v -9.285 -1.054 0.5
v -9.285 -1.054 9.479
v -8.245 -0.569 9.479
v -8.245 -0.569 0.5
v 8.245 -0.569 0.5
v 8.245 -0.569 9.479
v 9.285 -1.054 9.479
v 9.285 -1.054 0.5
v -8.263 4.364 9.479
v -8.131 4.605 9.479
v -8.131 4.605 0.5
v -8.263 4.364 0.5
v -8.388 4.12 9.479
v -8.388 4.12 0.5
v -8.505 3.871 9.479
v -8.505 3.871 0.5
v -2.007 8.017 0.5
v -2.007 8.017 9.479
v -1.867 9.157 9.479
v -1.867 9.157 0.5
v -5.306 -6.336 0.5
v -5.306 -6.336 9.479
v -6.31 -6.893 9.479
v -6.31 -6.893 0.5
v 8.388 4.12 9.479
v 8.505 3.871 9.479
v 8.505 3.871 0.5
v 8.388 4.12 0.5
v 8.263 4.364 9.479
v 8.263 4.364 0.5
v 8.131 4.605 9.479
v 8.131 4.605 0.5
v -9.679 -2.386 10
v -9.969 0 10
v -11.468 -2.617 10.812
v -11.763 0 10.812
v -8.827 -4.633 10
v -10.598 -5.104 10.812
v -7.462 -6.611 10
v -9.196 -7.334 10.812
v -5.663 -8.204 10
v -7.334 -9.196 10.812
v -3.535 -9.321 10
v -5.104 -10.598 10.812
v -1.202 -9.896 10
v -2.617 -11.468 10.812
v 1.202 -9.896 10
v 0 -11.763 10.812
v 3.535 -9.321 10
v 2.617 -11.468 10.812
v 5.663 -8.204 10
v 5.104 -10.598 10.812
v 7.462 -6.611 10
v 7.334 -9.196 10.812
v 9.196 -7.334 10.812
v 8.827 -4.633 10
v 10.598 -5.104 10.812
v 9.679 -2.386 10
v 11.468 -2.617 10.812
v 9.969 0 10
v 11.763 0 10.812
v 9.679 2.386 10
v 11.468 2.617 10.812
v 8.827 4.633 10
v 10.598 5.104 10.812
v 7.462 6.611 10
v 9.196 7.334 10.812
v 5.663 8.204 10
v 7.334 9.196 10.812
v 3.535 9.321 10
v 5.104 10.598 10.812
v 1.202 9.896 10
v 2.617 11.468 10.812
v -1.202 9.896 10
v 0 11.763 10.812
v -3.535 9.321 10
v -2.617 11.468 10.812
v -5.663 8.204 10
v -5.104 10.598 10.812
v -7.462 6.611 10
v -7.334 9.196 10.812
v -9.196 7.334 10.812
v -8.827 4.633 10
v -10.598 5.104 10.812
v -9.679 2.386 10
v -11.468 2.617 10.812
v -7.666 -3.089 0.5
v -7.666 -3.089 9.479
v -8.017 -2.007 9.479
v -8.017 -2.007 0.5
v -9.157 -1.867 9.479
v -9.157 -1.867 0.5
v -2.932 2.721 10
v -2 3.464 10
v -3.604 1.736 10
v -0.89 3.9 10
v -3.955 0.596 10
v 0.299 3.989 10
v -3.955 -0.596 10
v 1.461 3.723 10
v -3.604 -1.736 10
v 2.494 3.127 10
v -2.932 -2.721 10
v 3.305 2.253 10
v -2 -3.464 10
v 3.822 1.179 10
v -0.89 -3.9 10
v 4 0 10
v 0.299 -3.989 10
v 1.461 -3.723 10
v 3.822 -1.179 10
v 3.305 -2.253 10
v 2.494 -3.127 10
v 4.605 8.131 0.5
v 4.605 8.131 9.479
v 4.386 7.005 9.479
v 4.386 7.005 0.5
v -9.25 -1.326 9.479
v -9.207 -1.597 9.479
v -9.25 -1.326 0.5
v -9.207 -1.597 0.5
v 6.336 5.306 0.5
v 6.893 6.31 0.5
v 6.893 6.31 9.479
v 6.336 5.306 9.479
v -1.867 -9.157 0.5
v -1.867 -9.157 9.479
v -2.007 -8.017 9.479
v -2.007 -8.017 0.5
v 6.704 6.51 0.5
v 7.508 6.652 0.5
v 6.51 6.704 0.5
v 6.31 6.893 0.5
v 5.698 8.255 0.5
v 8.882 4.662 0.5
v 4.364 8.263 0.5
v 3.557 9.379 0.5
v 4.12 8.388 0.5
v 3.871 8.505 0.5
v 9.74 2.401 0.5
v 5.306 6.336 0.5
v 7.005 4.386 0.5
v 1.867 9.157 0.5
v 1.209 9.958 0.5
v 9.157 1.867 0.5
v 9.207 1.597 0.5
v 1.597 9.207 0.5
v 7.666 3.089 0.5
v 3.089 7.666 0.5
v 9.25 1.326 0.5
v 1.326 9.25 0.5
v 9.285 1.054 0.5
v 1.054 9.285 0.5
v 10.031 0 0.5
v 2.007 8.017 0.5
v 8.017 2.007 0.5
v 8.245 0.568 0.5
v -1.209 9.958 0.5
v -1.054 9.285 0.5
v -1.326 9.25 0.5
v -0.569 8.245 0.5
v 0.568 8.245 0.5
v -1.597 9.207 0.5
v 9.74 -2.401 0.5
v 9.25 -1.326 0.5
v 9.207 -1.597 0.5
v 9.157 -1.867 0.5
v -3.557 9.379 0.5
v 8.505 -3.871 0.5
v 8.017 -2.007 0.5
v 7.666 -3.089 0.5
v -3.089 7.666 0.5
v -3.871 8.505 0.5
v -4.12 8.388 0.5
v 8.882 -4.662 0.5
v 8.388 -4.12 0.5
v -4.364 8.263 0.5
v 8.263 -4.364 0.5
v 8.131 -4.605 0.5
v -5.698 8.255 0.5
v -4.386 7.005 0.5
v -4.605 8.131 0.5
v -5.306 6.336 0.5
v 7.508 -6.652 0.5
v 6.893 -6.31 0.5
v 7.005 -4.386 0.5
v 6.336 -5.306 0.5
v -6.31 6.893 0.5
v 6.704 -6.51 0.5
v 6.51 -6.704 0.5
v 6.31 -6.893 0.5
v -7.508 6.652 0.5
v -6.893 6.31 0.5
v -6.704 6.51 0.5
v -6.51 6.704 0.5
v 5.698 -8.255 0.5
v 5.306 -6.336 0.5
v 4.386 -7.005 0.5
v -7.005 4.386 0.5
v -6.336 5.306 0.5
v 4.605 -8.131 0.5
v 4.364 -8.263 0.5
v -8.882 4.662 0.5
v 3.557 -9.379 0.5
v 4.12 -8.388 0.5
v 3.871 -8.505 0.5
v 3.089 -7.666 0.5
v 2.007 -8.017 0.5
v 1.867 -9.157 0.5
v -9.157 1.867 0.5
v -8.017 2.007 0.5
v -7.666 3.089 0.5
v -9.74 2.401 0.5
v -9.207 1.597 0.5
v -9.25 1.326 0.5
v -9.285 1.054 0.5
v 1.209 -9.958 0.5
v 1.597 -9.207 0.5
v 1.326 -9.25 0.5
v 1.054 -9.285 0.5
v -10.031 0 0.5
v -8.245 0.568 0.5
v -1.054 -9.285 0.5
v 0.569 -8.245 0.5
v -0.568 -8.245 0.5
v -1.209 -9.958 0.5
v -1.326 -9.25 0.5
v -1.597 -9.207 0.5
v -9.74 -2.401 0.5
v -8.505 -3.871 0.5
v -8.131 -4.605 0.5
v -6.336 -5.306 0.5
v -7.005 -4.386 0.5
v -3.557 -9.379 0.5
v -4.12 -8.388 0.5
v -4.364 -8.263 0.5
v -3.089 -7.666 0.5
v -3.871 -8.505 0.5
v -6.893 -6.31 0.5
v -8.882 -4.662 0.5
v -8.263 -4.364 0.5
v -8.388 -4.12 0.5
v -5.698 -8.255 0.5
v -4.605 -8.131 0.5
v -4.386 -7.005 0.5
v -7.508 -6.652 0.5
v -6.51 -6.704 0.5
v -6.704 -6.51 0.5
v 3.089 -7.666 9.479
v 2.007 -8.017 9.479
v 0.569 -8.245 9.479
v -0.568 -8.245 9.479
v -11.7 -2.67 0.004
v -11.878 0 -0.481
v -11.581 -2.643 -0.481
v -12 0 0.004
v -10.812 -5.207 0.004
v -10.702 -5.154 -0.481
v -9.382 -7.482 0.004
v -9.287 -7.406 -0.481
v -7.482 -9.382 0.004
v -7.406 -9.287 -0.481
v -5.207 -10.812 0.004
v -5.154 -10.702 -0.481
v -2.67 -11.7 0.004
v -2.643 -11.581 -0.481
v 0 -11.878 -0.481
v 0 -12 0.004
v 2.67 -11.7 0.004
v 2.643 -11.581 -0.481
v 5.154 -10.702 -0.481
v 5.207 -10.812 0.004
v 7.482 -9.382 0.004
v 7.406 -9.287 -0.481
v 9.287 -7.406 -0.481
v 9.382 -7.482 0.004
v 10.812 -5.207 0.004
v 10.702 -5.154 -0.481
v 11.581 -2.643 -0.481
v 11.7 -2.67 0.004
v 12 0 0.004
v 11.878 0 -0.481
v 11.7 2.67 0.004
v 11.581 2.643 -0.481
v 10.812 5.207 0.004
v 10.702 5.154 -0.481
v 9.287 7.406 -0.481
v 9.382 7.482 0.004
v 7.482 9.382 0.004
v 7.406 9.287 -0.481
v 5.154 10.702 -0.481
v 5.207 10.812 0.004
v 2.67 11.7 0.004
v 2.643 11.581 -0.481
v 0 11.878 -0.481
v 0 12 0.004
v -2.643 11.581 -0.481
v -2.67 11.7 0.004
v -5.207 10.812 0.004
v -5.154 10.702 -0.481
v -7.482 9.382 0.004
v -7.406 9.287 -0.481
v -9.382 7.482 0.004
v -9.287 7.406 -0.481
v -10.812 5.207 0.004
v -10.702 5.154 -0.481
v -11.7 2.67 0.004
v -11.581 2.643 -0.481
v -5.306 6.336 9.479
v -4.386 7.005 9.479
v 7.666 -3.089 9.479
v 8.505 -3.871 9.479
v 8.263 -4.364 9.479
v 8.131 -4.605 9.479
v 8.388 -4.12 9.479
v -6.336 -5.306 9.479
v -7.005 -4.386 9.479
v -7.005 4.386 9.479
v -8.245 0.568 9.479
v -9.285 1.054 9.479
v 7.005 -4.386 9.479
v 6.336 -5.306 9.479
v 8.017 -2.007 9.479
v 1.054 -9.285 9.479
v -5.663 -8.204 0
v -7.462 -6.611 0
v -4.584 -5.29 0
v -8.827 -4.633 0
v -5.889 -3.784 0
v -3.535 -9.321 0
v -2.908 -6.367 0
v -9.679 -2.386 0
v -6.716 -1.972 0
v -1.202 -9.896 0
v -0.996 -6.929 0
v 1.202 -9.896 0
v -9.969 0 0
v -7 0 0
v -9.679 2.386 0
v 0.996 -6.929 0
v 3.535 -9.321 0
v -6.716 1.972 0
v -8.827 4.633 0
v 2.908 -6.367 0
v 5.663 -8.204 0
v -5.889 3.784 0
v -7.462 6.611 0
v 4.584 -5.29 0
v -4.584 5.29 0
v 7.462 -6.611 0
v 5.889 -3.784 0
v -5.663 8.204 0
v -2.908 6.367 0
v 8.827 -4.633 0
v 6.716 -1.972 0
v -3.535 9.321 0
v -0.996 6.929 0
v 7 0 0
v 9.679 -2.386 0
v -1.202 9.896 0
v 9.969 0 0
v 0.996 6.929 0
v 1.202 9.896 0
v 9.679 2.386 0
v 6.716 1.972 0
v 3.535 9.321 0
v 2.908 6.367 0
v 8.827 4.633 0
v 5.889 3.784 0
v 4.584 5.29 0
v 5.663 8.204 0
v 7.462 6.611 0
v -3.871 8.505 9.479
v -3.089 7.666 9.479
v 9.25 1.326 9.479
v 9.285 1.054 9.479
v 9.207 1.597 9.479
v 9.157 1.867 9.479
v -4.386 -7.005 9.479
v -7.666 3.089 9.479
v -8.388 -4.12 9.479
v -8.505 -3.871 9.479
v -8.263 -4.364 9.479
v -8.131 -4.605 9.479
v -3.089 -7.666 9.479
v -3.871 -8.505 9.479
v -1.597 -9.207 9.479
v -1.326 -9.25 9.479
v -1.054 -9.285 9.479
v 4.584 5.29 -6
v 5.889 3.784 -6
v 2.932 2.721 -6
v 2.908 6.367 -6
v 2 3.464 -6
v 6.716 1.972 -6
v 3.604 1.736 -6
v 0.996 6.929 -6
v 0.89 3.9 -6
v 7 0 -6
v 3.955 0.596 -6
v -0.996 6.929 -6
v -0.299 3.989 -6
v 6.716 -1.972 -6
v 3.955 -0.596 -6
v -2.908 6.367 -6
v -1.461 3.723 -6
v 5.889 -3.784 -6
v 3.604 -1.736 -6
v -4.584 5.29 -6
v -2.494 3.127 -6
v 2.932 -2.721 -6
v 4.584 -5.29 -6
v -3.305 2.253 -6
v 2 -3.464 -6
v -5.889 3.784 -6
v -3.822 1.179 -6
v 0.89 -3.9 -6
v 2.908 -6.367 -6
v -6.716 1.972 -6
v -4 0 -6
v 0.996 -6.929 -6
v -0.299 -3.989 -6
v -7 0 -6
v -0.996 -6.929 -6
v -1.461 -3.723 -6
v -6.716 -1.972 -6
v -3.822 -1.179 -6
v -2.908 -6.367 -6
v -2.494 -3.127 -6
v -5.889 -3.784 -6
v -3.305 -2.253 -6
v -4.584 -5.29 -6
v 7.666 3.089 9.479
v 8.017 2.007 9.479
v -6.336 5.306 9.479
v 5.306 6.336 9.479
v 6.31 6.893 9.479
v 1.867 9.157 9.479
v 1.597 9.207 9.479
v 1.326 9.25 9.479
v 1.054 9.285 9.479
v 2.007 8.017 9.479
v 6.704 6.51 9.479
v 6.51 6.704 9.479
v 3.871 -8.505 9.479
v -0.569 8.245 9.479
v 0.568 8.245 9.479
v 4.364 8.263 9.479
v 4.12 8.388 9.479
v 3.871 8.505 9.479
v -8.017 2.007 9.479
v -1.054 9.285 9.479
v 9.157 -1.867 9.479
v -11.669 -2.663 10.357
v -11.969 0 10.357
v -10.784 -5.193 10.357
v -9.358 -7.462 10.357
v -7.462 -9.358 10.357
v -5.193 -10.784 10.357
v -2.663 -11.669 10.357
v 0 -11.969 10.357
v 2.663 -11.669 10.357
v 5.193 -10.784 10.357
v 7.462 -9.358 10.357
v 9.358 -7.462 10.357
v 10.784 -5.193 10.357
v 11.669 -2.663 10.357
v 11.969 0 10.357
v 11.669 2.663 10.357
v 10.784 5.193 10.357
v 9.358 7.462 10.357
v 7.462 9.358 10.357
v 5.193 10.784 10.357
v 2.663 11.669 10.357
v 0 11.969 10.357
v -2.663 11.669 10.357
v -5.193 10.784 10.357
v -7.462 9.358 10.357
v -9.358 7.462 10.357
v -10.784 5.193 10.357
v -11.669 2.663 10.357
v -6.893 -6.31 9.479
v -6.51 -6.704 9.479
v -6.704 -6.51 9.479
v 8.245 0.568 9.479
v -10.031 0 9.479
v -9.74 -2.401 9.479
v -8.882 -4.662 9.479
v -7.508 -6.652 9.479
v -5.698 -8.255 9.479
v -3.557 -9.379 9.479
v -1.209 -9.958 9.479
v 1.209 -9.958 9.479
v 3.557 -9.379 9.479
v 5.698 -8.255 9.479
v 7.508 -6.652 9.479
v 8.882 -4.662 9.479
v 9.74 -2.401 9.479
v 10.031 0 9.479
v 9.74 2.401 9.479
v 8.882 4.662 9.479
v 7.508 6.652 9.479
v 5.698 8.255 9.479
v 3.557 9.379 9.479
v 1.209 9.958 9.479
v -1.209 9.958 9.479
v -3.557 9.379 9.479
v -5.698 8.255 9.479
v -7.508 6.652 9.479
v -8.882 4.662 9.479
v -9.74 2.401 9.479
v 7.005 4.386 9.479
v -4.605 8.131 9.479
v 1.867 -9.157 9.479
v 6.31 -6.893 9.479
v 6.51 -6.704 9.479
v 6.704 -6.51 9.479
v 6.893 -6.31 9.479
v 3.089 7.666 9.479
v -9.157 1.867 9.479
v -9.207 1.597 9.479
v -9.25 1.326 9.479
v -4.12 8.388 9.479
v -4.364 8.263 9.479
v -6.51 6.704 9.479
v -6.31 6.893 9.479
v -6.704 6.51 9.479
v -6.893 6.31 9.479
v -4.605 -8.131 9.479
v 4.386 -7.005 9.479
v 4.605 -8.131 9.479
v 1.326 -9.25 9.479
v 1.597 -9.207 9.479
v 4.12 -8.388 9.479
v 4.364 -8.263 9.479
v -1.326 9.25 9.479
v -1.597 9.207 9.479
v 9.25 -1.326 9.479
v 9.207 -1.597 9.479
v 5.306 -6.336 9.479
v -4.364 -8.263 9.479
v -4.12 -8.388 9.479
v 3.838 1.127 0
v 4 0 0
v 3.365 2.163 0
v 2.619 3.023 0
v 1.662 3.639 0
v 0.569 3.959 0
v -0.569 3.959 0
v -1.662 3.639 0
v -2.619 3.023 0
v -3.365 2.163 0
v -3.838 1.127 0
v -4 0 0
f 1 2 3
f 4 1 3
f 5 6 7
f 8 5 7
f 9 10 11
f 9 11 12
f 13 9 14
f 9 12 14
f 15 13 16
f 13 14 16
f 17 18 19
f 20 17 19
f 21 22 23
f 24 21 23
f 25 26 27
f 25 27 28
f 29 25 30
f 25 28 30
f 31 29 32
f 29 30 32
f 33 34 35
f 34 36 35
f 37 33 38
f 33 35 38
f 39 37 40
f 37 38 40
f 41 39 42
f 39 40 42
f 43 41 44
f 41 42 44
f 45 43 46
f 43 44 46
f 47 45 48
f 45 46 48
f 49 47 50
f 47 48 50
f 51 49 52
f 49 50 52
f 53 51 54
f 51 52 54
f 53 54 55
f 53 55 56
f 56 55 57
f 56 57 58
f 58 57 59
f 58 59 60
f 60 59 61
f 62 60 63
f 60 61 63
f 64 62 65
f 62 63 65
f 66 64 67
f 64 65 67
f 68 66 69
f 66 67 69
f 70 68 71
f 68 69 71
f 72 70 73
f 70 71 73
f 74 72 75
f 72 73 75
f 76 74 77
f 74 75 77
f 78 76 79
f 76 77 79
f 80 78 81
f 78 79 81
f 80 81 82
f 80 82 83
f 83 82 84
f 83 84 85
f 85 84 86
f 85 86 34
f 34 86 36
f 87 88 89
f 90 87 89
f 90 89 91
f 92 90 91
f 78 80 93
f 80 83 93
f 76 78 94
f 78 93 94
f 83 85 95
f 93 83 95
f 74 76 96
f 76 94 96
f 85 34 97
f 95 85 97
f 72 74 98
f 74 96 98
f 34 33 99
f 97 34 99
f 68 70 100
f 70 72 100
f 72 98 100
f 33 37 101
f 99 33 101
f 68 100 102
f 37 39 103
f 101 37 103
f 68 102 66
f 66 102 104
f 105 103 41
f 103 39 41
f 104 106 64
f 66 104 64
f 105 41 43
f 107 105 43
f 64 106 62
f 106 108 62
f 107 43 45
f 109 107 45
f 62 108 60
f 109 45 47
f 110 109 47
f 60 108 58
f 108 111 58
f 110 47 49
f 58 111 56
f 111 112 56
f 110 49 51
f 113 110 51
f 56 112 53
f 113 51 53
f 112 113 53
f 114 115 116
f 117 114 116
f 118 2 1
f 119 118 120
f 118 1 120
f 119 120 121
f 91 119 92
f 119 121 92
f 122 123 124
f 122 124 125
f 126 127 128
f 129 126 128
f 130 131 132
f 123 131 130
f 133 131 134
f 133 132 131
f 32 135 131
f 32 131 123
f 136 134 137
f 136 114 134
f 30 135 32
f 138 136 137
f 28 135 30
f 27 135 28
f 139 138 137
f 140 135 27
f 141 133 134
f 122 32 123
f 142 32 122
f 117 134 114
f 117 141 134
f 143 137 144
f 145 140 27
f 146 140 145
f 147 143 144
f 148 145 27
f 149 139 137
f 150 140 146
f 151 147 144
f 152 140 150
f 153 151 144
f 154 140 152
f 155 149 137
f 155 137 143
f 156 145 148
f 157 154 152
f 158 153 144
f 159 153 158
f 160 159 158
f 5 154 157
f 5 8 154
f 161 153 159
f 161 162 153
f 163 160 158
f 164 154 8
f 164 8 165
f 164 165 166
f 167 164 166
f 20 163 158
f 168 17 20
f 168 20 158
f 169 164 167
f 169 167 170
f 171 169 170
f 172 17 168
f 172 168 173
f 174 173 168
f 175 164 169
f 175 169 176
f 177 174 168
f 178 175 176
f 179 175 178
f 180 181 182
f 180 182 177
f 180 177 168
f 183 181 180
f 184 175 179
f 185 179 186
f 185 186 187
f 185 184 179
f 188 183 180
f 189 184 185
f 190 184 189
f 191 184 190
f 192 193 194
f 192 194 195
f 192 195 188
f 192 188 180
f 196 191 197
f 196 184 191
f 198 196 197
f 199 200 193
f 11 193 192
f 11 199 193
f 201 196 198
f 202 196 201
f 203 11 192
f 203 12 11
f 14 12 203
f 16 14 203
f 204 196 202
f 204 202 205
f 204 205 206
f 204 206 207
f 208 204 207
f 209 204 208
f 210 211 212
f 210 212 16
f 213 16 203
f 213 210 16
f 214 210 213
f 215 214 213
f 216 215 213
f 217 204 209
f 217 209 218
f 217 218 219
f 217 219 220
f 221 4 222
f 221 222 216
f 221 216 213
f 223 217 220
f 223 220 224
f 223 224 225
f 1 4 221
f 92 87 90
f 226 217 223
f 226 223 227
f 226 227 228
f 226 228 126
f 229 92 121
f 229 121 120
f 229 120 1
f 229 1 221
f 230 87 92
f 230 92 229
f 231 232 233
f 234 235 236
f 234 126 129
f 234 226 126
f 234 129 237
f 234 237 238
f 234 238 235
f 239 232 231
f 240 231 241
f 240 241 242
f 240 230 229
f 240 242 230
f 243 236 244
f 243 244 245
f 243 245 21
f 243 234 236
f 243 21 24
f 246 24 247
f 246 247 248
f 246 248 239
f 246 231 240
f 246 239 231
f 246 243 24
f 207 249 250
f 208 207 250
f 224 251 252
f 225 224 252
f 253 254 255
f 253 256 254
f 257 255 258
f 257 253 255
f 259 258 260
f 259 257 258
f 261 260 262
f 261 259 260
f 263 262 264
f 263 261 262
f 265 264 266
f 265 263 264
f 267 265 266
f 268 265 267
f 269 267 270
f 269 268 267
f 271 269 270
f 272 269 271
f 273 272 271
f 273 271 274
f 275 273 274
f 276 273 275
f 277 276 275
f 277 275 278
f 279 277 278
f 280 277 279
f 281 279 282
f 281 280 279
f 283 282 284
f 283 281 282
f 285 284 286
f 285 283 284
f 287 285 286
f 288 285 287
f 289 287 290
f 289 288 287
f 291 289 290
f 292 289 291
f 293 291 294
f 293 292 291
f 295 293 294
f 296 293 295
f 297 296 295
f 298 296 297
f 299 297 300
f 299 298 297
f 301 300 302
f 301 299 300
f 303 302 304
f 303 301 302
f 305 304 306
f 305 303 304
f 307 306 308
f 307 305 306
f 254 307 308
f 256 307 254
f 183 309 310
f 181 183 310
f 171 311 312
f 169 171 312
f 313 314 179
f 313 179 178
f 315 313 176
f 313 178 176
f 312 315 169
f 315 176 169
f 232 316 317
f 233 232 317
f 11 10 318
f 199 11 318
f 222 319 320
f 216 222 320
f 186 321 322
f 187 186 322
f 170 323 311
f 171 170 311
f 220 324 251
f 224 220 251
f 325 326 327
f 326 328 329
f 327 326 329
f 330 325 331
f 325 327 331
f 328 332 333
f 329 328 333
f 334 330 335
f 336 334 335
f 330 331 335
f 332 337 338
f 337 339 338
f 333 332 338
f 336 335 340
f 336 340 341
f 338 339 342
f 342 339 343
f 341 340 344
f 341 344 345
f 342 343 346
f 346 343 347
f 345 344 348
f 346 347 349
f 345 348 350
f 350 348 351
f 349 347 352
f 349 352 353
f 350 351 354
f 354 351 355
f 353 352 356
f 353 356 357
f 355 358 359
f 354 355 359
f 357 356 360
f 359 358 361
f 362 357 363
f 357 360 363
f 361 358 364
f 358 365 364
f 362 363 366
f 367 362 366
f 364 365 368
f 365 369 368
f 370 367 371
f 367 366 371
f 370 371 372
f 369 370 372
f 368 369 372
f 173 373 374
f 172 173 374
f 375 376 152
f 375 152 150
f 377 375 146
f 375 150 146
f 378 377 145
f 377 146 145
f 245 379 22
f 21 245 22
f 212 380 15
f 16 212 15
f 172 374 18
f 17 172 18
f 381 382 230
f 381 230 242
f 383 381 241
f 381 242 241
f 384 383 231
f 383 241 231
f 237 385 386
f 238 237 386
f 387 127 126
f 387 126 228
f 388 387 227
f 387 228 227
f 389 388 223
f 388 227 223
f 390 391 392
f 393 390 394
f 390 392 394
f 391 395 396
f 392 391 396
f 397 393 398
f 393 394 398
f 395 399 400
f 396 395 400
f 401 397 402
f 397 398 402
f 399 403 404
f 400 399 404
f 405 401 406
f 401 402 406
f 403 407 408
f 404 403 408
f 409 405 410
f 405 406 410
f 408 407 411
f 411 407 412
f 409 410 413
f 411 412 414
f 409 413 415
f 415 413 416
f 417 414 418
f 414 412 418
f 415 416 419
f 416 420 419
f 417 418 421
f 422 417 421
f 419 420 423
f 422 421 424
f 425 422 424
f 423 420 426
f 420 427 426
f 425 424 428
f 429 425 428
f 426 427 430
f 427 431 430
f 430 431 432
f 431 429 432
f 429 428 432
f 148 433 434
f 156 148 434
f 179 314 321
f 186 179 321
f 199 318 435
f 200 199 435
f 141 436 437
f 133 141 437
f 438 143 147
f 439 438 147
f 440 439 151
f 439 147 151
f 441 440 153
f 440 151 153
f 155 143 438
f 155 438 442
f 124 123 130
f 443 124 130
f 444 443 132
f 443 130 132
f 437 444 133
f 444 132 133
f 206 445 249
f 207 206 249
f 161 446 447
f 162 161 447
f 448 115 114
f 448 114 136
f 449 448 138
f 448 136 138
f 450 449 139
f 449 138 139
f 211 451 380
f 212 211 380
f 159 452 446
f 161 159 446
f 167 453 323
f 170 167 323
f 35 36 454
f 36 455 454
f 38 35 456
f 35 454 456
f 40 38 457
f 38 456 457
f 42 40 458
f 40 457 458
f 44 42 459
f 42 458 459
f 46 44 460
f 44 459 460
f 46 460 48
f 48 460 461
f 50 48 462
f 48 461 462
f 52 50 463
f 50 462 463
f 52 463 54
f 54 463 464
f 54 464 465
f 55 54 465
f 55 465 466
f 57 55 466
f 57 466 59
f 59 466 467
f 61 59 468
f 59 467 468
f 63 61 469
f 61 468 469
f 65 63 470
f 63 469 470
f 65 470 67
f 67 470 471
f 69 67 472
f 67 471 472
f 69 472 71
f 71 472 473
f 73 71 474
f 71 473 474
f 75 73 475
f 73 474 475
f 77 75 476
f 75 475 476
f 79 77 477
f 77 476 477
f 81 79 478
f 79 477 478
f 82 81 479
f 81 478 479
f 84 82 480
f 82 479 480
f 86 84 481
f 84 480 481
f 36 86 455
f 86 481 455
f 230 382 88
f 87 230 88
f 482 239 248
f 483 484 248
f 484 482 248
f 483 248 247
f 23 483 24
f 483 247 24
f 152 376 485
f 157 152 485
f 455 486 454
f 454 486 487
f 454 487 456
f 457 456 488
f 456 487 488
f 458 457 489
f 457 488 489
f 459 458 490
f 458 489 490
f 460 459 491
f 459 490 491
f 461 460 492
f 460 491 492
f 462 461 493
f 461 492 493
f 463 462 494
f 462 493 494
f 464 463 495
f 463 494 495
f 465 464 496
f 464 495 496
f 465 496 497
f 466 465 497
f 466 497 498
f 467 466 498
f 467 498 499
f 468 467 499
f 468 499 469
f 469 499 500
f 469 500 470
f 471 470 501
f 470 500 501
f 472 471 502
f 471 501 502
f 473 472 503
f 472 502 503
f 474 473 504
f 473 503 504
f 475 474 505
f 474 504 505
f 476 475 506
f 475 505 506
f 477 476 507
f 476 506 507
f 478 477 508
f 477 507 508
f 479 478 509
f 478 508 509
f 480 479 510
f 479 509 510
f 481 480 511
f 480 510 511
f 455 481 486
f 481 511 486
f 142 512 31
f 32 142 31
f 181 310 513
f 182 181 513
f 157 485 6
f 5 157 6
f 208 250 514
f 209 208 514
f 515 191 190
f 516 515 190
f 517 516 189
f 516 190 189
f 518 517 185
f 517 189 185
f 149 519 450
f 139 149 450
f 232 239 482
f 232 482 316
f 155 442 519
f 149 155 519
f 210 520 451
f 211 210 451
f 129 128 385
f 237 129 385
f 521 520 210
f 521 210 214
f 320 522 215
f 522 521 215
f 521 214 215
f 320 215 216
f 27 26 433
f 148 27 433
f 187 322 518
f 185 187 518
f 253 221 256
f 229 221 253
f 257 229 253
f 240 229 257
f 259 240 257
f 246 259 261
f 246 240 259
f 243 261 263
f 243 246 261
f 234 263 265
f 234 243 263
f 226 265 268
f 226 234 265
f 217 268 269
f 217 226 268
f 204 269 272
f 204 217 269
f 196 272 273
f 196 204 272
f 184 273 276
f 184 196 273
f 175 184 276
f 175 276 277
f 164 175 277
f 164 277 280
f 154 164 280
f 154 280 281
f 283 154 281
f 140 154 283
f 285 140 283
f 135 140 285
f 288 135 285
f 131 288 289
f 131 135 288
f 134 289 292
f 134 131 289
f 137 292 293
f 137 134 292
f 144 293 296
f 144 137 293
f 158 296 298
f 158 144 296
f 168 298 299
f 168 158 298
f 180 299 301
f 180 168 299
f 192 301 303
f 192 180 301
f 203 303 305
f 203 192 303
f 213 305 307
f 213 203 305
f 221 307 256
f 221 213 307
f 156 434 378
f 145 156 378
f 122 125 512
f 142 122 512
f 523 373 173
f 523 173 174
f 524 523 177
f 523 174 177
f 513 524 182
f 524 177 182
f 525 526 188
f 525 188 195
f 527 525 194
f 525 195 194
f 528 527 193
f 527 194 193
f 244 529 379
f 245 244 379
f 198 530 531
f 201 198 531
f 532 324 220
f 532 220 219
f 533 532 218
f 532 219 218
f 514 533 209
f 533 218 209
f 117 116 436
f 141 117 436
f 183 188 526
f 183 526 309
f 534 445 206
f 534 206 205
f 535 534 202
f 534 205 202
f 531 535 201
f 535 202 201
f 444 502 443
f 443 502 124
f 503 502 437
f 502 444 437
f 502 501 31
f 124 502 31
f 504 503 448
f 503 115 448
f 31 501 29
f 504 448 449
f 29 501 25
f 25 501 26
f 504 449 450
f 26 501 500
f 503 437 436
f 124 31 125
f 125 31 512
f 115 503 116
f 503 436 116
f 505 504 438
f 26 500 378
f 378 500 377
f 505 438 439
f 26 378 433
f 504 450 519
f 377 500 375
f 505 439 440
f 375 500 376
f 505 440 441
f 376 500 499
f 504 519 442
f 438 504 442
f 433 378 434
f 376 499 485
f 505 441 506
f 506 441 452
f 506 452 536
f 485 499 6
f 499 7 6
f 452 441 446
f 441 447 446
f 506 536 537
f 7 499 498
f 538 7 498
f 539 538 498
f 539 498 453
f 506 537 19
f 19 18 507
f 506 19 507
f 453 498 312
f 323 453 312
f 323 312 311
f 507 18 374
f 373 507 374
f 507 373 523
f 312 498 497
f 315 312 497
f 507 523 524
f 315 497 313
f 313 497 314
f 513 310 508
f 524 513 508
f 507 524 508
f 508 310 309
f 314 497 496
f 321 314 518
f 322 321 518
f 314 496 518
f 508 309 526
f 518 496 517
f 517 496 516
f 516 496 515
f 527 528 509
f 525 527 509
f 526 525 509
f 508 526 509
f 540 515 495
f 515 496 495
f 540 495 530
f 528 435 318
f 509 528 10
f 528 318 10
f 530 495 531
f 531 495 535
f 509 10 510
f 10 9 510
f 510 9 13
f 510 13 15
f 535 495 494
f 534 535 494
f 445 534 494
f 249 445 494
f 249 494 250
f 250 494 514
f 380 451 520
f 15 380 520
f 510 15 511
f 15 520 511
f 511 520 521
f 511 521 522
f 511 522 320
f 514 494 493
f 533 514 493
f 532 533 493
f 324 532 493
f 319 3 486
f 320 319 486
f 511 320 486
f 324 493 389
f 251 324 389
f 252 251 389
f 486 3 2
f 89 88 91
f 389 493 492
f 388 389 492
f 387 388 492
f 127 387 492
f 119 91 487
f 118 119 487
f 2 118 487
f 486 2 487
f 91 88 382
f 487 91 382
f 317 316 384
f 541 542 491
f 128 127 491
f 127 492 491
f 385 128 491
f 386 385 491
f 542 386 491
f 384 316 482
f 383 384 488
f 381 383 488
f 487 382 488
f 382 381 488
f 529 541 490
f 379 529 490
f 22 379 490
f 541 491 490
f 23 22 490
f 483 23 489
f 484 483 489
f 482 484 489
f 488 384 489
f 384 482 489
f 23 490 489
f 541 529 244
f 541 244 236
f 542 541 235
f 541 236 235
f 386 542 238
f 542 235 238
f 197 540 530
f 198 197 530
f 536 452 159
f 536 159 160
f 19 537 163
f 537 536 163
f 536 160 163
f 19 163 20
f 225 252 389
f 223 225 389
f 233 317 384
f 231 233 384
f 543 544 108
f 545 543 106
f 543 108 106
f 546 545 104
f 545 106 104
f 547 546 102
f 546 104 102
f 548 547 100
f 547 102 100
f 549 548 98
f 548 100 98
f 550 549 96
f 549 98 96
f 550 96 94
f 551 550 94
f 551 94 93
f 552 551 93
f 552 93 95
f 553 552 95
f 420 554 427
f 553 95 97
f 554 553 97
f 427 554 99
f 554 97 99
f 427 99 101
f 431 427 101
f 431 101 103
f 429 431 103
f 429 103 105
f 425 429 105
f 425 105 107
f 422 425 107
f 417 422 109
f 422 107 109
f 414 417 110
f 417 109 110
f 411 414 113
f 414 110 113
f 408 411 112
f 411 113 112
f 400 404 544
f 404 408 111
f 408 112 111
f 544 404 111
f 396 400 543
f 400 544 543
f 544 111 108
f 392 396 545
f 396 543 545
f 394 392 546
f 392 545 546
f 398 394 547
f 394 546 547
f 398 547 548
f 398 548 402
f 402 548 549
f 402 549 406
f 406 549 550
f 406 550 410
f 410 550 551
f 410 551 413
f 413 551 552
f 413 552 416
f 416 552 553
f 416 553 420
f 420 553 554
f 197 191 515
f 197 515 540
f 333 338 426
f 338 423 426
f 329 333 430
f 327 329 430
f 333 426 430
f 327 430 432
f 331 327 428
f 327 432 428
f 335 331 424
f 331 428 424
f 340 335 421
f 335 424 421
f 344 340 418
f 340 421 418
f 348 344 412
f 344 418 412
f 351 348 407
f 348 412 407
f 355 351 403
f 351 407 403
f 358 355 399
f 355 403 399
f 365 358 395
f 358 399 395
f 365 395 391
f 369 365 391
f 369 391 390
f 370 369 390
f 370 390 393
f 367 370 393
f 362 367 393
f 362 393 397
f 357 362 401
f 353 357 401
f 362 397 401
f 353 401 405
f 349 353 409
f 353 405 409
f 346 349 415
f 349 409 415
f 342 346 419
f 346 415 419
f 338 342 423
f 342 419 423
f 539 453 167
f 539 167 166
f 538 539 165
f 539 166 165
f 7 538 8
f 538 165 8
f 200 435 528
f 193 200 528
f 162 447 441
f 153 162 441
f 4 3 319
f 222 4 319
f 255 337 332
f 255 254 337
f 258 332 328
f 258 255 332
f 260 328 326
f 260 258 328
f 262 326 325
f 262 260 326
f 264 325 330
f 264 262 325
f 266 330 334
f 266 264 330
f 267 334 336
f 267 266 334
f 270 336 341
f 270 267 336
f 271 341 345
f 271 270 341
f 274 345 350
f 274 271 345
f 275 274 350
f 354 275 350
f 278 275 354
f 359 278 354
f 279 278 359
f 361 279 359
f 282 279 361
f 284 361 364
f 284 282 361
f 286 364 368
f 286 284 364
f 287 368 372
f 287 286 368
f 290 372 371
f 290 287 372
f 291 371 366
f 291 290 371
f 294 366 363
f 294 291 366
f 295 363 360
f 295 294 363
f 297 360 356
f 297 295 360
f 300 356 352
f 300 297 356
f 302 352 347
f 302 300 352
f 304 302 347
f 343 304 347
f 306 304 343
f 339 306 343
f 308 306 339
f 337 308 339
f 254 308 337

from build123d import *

# Parameters (mm, degrees)
ESQUISSE1_R                  = 9.345000000000002
EXTRUSION1_DEPTH             = 10
EXTRUSION2_DEPTH             = 17.572810564294763
R_P_TITION_CIRCULAIRE1_COUNT = 20
ESQUISSE4_R                  = 4
EXTRUSION3_DEPTH             = 17.50568653417299


with BuildPart() as part:
    # Esquisse1 → Extrusion1 (new body)
    with BuildSketch(Plane.XY):
        Circle(ESQUISSE1_R)
    extrude(amount=EXTRUSION1_DEPTH)

    # Esquisse2 → Extrusion2 (cut, through all)
    with BuildSketch(Plane.XY.offset(10)):
        Polygon((-0.5685000000000011, 8.245), (0.5684999999999989, 8.245), (1.2888044910509866, 9.789697965932955), (-1.2888044910509753, 9.789697965932955), align=None)
    extrusion2 = extrude(amount=-EXTRUSION2_DEPTH, mode=Mode.SUBTRACT)

    # Répétition circulaire1: Extrusion2 ×20 about axis
    r_p_tition_circulaire1_axis = Axis((3e-17, -4.2e-16, 0), (0, 0, 1))
    for i in range(1, R_P_TITION_CIRCULAIRE1_COUNT):
        add(extrusion2.rotate(r_p_tition_circulaire1_axis, i * 360 / R_P_TITION_CIRCULAIRE1_COUNT), mode=Mode.SUBTRACT)

    # Esquisse4 → Extrusion3 (cut, through all)
    with BuildSketch(Plane.XY.offset(10)):
        Circle(ESQUISSE4_R)
    extrude(amount=-EXTRUSION3_DEPTH, mode=Mode.SUBTRACT)

    # Esquisse5 → Révolution1 (revolve)
    with BuildSketch(Plane(origin=(0, 0, 0), x_dir=(0, 0, -1), z_dir=(1, 0, 0)), mode=Mode.PRIVATE) as r_volution1_sk:
        Polygon((-10, 8), (-10, 9.969000000000001), (-10.812476697134908, 11.762555858236022), (-10.357028282143537, 11.96887294740182), (-9.479176274054629, 10.031), (-9.479176274054645, 8), align=None)
        Polygon((0, 8), (-5.9e-16, 9.969000000000001), (0.48091741384473186, 11.878366240683253), (-0.00393942736482848, 12.00048848899324), (-0.5, 10.031), (-0.4999999999999998, 8), align=None)
        Polygon((0, 7), (6, 6.999999999999999), (6.000000000000001, 4), (4.6e-16, 4), align=None)
    revolve(r_volution1_sk.sketch.rotate(Axis((0, 0, -0.6503339320090771), (0, 0, 1)), 90), axis=Axis((0, 0, -0.6503339320090771), (0, 0, 1)))


solid = part.part
